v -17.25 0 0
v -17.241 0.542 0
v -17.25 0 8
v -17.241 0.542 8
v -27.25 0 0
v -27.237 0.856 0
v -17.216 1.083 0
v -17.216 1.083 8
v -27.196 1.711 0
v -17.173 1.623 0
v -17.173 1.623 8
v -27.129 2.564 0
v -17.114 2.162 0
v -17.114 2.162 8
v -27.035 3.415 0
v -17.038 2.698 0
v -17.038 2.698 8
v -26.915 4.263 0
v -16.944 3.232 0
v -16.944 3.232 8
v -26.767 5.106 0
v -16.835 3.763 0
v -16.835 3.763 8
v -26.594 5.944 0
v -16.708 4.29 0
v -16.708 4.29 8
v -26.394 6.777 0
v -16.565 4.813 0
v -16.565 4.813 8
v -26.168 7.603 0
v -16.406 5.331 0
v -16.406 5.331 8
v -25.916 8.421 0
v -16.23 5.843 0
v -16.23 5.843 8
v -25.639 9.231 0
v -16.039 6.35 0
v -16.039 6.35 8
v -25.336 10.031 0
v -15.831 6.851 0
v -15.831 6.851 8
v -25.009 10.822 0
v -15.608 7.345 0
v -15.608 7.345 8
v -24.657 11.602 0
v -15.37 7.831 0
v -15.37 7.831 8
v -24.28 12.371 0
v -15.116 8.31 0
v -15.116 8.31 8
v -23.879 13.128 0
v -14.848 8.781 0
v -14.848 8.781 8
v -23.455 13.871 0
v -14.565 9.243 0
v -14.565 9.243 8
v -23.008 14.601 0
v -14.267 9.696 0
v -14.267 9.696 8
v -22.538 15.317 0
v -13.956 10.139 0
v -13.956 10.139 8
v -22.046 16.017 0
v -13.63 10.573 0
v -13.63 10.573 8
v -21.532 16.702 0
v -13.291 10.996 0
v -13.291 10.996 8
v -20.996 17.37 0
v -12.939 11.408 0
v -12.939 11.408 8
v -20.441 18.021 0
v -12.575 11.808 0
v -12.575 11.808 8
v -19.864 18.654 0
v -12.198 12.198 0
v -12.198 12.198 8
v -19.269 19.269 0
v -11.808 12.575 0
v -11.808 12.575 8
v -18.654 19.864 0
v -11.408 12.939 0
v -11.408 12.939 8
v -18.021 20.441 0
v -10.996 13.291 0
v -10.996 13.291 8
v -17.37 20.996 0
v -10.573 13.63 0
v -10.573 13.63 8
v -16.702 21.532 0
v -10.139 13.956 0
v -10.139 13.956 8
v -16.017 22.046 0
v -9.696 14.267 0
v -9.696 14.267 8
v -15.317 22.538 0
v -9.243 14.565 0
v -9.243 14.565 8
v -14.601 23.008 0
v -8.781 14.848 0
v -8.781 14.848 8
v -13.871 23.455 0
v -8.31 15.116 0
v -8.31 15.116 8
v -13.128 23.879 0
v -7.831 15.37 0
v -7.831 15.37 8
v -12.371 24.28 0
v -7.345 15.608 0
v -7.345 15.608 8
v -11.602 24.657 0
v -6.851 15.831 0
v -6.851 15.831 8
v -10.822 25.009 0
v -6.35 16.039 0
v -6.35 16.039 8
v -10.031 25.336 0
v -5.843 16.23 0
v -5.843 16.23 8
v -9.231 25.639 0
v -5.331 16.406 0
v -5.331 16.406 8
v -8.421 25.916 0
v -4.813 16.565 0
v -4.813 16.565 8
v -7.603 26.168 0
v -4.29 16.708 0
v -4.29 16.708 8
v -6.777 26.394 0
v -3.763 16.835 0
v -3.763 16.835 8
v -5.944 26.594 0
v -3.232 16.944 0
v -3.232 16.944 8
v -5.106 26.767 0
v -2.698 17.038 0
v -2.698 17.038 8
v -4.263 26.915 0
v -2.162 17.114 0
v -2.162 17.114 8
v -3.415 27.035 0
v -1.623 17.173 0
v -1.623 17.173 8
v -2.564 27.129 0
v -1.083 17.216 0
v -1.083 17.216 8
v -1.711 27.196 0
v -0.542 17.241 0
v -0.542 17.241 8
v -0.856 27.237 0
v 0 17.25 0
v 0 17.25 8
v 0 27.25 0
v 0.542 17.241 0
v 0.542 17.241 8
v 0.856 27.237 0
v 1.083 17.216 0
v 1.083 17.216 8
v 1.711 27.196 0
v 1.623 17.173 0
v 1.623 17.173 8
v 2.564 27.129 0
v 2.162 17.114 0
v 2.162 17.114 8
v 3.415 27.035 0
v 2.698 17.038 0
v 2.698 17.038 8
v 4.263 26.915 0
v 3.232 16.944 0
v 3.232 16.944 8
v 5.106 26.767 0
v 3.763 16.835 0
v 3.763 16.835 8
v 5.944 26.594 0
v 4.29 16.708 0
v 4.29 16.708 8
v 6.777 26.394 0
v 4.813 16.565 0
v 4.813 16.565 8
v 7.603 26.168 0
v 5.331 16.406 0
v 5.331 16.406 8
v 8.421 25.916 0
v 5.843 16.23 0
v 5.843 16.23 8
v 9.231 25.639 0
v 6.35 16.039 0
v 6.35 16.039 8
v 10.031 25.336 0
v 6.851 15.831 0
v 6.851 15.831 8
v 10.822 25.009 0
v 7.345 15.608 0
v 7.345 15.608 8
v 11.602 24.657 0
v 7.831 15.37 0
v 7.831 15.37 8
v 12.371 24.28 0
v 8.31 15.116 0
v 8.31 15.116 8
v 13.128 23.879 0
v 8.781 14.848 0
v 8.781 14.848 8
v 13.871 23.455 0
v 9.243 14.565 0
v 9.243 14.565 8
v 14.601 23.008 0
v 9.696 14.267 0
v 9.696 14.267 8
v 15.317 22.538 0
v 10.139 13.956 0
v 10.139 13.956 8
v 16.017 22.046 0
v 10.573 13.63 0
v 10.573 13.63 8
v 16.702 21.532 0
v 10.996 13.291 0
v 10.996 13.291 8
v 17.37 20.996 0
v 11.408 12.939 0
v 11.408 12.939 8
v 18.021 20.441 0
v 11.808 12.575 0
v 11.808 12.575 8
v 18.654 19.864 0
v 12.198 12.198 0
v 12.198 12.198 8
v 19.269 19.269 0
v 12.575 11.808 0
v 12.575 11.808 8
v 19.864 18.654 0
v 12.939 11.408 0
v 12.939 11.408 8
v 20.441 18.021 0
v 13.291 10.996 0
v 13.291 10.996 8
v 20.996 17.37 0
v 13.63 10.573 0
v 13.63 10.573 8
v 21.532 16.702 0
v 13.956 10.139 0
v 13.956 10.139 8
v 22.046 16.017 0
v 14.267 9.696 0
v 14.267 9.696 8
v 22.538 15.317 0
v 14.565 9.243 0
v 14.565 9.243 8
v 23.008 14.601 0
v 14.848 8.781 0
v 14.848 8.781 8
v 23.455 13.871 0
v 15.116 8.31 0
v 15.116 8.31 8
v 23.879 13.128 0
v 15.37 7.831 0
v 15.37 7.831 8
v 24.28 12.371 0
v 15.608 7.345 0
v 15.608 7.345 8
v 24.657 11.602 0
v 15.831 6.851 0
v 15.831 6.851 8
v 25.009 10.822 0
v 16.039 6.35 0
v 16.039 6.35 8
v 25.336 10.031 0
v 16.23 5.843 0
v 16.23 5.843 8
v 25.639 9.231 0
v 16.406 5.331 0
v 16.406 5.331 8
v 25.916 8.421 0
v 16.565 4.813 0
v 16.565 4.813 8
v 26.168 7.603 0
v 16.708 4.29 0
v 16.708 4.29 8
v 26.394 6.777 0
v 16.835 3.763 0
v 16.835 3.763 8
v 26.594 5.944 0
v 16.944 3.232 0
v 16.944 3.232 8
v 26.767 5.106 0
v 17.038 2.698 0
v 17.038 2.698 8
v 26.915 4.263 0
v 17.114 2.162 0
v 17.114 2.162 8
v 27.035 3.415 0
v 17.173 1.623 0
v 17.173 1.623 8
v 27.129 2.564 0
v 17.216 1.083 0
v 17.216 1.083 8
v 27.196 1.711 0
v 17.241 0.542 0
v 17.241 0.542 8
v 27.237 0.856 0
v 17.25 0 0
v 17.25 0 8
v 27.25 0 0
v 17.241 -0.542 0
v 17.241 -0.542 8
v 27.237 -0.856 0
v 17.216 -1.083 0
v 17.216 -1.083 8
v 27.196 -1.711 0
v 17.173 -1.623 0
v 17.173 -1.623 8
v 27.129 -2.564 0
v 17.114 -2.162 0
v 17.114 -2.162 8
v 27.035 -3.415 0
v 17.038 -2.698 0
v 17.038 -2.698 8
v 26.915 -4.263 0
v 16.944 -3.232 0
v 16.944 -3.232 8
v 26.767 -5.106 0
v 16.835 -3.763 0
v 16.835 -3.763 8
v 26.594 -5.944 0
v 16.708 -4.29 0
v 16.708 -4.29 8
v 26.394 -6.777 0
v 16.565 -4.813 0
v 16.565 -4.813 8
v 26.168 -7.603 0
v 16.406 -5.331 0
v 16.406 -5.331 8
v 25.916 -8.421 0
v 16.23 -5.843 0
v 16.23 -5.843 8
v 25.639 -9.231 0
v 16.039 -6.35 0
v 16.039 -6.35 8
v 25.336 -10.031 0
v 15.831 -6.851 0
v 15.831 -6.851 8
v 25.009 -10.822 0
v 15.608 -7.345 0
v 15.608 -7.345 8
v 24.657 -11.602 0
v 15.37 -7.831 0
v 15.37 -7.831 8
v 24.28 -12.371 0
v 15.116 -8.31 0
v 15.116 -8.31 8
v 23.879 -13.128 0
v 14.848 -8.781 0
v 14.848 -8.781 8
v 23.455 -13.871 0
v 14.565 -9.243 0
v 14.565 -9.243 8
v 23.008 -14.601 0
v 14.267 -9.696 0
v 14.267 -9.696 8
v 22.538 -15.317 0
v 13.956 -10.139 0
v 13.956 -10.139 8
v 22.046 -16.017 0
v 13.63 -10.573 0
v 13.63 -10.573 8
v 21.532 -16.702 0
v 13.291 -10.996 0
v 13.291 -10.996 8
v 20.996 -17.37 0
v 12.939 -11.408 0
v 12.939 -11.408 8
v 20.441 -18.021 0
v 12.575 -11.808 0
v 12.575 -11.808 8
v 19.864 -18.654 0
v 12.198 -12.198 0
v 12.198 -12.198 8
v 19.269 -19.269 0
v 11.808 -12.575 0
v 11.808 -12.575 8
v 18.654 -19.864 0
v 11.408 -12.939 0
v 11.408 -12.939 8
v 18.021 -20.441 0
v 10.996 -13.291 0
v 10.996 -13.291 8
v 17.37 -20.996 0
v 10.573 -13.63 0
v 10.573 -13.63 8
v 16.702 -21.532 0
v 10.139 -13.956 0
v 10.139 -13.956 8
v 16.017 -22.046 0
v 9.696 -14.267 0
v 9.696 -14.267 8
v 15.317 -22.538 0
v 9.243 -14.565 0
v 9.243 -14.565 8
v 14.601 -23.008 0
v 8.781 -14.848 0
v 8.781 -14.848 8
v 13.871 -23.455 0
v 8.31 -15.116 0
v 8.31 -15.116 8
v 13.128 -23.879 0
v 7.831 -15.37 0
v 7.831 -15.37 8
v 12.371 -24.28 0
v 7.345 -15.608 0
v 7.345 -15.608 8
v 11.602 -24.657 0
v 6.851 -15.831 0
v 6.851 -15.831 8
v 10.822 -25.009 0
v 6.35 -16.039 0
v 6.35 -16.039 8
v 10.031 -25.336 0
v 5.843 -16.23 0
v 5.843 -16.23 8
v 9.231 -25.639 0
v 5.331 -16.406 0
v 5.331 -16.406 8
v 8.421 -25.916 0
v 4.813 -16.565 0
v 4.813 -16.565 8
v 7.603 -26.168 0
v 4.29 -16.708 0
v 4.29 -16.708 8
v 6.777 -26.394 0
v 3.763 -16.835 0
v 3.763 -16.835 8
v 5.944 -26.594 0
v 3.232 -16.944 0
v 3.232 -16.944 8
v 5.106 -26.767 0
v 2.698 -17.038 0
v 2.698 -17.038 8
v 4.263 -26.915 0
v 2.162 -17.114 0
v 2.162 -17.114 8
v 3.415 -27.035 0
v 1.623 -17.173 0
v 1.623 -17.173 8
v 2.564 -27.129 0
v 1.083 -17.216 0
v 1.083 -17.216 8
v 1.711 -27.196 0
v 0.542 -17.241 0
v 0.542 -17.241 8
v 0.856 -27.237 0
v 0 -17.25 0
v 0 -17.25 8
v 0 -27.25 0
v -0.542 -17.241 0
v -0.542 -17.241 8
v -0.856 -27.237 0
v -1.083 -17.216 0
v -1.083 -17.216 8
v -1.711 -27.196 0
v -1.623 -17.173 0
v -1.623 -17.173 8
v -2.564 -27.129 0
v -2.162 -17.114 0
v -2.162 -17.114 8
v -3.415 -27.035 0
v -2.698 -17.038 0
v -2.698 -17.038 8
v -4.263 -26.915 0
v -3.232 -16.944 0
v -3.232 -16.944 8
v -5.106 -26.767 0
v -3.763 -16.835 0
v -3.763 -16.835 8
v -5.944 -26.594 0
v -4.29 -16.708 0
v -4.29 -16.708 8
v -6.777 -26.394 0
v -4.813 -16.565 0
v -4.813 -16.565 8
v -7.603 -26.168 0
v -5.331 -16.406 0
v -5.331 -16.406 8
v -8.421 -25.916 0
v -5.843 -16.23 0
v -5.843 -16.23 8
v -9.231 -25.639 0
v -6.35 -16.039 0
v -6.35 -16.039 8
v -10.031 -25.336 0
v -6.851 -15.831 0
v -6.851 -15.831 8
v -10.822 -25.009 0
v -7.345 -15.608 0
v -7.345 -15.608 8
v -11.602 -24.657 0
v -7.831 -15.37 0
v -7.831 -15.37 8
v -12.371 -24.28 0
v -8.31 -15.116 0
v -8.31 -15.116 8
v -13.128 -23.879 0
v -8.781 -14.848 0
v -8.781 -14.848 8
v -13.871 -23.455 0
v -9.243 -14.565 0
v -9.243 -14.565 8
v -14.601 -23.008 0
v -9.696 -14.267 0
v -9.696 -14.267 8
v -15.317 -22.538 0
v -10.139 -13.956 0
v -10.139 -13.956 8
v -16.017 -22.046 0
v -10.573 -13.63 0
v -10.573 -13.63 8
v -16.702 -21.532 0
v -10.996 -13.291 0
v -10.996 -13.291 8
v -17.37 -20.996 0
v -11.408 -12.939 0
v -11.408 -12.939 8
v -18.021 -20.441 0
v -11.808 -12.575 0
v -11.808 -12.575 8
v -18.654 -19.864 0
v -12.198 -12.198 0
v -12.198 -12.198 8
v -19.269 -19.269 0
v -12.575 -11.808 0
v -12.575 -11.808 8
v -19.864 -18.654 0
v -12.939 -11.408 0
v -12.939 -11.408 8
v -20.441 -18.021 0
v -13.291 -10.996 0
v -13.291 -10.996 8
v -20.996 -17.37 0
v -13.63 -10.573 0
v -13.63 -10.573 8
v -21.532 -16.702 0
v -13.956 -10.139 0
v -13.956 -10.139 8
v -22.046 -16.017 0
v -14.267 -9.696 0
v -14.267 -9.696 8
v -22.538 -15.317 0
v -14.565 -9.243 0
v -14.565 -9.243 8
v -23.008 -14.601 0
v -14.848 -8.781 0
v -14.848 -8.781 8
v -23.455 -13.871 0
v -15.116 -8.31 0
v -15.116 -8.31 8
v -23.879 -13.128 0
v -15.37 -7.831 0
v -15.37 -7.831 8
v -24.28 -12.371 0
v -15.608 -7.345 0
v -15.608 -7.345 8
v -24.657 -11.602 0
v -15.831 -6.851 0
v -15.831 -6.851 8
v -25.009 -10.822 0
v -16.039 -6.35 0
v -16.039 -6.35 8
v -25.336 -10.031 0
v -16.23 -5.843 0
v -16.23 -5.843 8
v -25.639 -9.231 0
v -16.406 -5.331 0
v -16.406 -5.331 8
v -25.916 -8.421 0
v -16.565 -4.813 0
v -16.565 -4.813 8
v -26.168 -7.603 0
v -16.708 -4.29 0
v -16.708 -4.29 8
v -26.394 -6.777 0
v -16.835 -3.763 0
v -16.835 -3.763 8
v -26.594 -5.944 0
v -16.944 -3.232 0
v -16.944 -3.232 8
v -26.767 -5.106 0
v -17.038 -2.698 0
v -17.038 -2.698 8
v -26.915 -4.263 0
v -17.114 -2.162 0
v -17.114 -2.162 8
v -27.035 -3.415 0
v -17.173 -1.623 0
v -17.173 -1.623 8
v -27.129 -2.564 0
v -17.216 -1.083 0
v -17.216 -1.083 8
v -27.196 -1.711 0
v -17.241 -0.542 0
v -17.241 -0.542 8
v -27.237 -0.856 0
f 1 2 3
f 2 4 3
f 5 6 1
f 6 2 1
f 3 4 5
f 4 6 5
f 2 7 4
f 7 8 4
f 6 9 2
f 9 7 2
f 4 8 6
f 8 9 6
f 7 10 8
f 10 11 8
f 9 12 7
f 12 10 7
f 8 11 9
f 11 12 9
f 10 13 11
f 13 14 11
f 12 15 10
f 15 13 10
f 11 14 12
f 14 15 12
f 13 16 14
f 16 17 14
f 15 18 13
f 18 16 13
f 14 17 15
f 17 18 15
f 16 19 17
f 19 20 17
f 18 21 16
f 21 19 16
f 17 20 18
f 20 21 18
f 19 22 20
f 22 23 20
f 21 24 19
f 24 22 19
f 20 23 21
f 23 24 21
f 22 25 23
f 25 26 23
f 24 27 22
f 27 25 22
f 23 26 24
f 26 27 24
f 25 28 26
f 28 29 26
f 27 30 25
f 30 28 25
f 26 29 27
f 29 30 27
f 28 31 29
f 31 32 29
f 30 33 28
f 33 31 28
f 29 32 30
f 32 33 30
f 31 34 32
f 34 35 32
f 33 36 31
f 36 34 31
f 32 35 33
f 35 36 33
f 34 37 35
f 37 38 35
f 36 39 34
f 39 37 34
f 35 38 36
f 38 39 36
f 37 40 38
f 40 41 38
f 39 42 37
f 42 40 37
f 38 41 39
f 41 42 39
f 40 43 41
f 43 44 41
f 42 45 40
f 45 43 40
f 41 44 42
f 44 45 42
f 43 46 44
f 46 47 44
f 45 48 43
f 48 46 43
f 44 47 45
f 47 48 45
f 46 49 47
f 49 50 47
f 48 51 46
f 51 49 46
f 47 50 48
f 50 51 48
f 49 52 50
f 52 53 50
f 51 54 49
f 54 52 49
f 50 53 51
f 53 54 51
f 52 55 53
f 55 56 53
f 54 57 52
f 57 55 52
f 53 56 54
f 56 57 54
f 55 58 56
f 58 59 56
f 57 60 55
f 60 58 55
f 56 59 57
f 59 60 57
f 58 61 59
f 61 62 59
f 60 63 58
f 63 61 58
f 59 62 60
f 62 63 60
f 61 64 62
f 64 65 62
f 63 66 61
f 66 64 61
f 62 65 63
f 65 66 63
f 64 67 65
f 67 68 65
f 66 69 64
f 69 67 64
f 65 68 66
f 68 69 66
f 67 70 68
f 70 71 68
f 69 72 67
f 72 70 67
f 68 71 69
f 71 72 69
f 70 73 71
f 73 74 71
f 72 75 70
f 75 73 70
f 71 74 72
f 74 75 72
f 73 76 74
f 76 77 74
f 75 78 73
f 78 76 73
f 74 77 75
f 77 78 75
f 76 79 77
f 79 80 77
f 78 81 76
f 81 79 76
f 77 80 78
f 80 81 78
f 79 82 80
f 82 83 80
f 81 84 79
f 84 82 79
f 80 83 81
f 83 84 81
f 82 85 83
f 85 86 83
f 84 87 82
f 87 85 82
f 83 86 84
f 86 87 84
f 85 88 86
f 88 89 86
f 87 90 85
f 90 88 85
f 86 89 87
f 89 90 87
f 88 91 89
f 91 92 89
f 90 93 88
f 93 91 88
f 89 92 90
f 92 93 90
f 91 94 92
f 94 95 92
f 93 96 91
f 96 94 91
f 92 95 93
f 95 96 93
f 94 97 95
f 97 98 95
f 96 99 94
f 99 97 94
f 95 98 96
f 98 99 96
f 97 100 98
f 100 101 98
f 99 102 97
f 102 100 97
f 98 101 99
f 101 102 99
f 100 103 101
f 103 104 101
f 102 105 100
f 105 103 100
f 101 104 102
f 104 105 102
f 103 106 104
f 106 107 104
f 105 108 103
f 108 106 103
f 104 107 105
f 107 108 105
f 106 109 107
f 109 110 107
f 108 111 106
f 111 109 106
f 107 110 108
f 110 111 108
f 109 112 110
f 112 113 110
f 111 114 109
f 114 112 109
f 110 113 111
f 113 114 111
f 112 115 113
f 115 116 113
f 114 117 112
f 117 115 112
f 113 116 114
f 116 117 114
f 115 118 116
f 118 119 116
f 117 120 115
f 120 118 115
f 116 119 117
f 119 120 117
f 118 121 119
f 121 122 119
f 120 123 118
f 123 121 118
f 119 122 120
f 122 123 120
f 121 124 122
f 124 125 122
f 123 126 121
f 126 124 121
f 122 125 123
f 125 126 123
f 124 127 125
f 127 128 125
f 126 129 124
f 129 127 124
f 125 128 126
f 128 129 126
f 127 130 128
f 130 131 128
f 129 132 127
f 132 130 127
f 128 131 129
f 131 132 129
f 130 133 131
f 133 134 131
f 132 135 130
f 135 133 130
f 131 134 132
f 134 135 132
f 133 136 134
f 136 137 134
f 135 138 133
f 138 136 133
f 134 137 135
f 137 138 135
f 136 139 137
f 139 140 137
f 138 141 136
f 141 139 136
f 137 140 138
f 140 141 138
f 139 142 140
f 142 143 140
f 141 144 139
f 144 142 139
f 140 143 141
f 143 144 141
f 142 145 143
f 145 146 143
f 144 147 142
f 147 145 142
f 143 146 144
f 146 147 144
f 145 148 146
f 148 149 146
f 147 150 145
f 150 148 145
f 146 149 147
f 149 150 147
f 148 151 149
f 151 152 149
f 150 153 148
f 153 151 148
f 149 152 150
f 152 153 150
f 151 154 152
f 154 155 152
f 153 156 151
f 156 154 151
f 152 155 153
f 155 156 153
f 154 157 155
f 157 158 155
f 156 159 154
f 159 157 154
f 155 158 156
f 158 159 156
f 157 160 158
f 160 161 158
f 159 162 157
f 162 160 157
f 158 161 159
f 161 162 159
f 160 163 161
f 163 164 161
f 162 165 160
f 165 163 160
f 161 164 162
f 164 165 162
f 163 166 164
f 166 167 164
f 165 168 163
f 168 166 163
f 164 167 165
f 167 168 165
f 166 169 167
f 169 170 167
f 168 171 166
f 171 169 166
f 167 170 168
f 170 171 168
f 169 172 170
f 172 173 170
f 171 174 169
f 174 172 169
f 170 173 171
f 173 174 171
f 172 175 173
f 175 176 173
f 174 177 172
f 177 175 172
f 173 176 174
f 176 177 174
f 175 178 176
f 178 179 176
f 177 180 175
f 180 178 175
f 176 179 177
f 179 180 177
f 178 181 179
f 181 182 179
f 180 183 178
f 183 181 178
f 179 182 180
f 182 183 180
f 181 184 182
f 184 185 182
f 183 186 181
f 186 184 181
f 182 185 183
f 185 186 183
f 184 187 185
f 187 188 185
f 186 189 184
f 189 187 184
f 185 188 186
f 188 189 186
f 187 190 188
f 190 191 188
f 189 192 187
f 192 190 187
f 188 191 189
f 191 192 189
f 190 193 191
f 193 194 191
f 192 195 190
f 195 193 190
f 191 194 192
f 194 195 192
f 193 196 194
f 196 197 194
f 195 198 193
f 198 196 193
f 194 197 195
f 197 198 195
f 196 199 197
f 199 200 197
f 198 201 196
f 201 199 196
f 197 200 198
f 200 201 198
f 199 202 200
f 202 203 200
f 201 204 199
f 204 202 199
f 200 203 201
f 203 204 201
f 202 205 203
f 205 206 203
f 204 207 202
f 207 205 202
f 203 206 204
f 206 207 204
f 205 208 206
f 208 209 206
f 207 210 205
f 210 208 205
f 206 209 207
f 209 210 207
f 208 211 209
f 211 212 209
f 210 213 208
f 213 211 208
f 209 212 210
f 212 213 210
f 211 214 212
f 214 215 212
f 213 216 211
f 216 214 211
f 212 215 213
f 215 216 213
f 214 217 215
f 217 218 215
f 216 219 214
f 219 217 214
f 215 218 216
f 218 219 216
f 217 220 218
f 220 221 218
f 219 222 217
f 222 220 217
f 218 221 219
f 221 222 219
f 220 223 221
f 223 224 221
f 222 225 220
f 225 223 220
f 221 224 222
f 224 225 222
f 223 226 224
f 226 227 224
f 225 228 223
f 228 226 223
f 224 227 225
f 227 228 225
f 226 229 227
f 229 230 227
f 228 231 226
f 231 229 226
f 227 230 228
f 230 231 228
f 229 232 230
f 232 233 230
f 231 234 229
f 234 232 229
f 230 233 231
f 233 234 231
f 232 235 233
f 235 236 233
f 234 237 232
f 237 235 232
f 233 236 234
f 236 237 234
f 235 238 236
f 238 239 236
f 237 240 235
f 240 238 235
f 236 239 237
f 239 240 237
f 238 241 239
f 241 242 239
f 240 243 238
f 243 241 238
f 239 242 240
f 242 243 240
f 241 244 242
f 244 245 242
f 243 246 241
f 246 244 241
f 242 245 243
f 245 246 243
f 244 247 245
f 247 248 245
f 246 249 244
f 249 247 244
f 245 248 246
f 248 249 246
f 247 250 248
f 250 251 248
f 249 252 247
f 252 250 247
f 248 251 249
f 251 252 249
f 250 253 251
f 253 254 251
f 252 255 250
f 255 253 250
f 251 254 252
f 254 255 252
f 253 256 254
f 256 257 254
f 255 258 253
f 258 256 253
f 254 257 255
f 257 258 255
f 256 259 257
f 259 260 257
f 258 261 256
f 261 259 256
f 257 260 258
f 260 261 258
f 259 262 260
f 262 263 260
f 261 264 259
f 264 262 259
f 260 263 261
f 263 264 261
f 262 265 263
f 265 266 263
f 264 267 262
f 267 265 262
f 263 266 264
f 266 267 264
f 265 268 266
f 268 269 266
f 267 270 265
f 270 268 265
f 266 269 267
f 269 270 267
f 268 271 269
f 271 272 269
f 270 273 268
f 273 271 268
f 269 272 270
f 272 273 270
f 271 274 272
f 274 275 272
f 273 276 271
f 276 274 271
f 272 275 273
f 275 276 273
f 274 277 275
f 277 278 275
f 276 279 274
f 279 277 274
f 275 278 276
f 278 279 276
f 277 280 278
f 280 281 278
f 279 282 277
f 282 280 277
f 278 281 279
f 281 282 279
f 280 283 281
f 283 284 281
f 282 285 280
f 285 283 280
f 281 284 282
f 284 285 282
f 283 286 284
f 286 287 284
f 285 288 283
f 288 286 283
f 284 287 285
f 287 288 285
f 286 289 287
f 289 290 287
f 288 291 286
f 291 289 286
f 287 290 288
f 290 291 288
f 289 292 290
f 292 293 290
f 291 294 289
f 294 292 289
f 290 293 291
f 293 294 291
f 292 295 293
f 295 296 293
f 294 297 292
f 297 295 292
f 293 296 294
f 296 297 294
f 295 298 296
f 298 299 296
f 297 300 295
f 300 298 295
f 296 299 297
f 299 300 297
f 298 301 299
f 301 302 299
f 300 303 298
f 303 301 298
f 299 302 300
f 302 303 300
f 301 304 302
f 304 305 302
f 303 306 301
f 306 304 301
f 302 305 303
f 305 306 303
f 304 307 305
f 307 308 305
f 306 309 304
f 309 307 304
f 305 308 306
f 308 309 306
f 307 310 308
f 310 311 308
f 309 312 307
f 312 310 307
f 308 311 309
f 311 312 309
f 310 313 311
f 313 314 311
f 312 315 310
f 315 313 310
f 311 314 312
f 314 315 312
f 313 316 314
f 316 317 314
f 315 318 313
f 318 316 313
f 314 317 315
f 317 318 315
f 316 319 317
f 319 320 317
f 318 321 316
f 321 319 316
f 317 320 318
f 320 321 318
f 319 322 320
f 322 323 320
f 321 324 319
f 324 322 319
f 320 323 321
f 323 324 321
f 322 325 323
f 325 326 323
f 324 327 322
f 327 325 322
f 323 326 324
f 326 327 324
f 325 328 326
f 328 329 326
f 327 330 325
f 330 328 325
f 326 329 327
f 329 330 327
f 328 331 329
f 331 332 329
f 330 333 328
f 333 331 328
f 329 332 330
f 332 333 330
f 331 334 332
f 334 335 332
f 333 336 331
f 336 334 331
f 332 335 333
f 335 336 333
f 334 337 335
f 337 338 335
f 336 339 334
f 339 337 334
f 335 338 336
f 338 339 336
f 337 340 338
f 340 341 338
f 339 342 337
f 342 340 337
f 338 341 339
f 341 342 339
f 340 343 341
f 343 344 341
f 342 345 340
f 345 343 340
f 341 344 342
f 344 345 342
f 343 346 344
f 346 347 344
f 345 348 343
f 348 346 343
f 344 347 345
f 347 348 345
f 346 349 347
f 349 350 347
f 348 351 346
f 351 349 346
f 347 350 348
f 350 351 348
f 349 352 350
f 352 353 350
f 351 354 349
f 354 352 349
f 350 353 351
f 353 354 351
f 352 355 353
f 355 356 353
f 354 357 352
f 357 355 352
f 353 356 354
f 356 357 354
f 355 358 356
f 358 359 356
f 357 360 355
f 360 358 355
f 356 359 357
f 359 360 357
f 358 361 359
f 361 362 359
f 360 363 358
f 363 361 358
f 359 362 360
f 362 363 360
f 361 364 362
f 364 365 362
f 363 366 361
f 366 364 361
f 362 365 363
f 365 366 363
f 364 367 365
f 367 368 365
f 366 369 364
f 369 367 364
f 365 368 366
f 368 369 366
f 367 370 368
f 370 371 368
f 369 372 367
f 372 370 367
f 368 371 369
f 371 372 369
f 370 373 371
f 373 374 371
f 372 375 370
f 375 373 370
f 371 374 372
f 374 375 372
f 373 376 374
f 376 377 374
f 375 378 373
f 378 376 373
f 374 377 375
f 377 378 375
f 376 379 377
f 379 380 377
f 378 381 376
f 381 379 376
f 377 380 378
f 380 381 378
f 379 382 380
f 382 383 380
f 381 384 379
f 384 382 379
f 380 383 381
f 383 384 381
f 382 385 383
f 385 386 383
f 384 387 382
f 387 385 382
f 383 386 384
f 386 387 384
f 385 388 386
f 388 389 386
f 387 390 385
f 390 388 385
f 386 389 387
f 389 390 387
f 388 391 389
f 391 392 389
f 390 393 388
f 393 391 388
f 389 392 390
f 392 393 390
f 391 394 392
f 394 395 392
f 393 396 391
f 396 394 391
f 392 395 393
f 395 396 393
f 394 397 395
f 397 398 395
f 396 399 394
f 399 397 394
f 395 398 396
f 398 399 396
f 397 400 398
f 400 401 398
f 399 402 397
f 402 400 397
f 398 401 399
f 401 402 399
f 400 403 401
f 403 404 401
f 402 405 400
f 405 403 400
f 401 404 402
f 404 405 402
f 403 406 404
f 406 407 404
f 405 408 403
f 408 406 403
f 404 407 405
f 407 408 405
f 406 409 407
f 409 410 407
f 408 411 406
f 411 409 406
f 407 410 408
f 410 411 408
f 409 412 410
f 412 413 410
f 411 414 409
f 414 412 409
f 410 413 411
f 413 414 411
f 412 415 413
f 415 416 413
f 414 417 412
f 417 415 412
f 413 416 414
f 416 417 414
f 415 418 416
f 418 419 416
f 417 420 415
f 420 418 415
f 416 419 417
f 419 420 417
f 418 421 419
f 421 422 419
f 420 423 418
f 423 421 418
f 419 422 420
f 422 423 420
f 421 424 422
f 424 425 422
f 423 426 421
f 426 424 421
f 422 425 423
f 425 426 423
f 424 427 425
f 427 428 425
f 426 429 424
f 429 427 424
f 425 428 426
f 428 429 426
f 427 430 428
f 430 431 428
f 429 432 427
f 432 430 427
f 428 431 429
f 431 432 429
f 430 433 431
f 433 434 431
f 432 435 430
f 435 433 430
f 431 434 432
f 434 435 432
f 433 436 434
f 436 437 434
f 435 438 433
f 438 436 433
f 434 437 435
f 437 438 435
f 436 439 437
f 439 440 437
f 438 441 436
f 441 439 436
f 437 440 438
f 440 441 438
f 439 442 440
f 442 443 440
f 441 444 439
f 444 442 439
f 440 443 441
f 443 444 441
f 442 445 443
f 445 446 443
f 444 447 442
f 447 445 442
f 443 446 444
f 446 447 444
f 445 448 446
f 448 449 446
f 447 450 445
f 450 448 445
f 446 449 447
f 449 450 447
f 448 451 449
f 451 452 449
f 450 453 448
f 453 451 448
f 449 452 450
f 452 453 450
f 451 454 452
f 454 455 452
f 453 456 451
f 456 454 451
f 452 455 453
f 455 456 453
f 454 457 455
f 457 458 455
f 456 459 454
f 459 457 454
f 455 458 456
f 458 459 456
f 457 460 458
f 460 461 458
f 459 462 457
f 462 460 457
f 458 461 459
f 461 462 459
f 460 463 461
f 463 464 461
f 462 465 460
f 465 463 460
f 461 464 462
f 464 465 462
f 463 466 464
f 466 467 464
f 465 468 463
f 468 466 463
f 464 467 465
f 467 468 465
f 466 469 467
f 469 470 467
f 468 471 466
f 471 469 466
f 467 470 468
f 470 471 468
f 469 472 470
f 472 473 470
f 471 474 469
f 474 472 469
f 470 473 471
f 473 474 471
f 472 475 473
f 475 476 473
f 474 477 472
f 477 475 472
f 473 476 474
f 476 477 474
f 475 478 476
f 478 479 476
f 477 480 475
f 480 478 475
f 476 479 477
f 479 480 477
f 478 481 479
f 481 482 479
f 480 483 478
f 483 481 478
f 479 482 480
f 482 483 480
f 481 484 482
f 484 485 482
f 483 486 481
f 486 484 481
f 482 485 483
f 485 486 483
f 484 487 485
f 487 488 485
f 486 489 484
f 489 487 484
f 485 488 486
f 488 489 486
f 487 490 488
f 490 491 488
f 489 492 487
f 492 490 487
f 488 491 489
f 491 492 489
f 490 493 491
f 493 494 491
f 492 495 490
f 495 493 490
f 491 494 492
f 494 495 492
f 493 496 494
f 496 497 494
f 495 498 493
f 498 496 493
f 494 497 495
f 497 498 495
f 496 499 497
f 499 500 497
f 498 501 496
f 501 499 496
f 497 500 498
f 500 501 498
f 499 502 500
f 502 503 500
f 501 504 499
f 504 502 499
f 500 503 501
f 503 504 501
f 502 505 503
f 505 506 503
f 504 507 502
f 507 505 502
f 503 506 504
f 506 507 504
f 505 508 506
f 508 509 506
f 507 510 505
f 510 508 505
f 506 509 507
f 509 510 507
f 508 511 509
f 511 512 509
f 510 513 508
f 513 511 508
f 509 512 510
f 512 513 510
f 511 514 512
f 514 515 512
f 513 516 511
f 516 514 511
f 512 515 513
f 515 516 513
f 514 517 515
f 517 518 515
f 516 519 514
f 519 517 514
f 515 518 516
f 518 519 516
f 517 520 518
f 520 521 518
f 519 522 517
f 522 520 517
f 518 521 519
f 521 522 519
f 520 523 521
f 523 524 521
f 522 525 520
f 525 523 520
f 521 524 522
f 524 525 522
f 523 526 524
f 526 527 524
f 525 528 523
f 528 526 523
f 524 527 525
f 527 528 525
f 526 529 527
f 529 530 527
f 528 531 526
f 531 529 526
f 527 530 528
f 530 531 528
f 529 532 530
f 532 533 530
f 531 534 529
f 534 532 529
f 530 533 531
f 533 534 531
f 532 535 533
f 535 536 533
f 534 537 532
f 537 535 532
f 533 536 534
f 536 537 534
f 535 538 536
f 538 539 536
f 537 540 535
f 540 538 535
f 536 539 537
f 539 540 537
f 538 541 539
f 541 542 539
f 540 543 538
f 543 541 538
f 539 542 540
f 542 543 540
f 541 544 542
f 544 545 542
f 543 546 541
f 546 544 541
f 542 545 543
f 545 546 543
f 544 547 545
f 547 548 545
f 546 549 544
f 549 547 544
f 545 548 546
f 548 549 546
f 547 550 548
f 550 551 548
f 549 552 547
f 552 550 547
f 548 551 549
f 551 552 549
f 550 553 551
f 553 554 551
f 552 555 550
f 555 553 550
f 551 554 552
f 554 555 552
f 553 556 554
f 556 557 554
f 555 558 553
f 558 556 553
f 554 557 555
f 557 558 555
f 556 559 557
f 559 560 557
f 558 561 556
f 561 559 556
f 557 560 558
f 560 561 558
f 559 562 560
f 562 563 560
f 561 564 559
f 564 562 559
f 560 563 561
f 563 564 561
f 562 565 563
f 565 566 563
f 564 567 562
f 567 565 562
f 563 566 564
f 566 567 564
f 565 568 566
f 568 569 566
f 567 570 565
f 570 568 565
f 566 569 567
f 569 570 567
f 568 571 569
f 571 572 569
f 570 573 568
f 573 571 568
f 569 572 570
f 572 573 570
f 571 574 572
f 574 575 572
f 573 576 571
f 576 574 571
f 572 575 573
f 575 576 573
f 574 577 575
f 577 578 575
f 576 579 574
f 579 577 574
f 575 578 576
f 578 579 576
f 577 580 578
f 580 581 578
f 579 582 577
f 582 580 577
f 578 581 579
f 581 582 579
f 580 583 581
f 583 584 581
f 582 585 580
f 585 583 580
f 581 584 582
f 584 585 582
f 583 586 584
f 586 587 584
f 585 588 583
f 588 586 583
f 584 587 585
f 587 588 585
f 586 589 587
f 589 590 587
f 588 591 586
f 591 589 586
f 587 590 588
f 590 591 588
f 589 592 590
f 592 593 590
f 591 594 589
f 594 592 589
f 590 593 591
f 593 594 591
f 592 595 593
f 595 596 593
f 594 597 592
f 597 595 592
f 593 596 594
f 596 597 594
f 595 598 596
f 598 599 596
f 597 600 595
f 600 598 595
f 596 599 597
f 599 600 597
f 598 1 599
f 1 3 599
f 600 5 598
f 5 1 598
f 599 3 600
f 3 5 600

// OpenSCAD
//in milimeters
//material flex
//t 90/245
hole_diameter=34.5;
outer_diameter=44.5;
thickness=8;

/*
translate([0,0,thickness/2]){
difference(){
//outer
cylinder(h=thickness,r=outer_diameter/2,center=true,$fn=100);
//hole
cylinder(h=thickness+2,r=hole_diameter/2,center=true,$fn=100);
}
}*/

triangle_points=[[0,0], [outer_diameter-hole_diameter,0],[0,thickness]];


module triang(){
translate([hole_diameter/2,0,0]) 
polygon(points=triangle_points);
}

//triang();

rotate_extrude($fn=200) triang();
